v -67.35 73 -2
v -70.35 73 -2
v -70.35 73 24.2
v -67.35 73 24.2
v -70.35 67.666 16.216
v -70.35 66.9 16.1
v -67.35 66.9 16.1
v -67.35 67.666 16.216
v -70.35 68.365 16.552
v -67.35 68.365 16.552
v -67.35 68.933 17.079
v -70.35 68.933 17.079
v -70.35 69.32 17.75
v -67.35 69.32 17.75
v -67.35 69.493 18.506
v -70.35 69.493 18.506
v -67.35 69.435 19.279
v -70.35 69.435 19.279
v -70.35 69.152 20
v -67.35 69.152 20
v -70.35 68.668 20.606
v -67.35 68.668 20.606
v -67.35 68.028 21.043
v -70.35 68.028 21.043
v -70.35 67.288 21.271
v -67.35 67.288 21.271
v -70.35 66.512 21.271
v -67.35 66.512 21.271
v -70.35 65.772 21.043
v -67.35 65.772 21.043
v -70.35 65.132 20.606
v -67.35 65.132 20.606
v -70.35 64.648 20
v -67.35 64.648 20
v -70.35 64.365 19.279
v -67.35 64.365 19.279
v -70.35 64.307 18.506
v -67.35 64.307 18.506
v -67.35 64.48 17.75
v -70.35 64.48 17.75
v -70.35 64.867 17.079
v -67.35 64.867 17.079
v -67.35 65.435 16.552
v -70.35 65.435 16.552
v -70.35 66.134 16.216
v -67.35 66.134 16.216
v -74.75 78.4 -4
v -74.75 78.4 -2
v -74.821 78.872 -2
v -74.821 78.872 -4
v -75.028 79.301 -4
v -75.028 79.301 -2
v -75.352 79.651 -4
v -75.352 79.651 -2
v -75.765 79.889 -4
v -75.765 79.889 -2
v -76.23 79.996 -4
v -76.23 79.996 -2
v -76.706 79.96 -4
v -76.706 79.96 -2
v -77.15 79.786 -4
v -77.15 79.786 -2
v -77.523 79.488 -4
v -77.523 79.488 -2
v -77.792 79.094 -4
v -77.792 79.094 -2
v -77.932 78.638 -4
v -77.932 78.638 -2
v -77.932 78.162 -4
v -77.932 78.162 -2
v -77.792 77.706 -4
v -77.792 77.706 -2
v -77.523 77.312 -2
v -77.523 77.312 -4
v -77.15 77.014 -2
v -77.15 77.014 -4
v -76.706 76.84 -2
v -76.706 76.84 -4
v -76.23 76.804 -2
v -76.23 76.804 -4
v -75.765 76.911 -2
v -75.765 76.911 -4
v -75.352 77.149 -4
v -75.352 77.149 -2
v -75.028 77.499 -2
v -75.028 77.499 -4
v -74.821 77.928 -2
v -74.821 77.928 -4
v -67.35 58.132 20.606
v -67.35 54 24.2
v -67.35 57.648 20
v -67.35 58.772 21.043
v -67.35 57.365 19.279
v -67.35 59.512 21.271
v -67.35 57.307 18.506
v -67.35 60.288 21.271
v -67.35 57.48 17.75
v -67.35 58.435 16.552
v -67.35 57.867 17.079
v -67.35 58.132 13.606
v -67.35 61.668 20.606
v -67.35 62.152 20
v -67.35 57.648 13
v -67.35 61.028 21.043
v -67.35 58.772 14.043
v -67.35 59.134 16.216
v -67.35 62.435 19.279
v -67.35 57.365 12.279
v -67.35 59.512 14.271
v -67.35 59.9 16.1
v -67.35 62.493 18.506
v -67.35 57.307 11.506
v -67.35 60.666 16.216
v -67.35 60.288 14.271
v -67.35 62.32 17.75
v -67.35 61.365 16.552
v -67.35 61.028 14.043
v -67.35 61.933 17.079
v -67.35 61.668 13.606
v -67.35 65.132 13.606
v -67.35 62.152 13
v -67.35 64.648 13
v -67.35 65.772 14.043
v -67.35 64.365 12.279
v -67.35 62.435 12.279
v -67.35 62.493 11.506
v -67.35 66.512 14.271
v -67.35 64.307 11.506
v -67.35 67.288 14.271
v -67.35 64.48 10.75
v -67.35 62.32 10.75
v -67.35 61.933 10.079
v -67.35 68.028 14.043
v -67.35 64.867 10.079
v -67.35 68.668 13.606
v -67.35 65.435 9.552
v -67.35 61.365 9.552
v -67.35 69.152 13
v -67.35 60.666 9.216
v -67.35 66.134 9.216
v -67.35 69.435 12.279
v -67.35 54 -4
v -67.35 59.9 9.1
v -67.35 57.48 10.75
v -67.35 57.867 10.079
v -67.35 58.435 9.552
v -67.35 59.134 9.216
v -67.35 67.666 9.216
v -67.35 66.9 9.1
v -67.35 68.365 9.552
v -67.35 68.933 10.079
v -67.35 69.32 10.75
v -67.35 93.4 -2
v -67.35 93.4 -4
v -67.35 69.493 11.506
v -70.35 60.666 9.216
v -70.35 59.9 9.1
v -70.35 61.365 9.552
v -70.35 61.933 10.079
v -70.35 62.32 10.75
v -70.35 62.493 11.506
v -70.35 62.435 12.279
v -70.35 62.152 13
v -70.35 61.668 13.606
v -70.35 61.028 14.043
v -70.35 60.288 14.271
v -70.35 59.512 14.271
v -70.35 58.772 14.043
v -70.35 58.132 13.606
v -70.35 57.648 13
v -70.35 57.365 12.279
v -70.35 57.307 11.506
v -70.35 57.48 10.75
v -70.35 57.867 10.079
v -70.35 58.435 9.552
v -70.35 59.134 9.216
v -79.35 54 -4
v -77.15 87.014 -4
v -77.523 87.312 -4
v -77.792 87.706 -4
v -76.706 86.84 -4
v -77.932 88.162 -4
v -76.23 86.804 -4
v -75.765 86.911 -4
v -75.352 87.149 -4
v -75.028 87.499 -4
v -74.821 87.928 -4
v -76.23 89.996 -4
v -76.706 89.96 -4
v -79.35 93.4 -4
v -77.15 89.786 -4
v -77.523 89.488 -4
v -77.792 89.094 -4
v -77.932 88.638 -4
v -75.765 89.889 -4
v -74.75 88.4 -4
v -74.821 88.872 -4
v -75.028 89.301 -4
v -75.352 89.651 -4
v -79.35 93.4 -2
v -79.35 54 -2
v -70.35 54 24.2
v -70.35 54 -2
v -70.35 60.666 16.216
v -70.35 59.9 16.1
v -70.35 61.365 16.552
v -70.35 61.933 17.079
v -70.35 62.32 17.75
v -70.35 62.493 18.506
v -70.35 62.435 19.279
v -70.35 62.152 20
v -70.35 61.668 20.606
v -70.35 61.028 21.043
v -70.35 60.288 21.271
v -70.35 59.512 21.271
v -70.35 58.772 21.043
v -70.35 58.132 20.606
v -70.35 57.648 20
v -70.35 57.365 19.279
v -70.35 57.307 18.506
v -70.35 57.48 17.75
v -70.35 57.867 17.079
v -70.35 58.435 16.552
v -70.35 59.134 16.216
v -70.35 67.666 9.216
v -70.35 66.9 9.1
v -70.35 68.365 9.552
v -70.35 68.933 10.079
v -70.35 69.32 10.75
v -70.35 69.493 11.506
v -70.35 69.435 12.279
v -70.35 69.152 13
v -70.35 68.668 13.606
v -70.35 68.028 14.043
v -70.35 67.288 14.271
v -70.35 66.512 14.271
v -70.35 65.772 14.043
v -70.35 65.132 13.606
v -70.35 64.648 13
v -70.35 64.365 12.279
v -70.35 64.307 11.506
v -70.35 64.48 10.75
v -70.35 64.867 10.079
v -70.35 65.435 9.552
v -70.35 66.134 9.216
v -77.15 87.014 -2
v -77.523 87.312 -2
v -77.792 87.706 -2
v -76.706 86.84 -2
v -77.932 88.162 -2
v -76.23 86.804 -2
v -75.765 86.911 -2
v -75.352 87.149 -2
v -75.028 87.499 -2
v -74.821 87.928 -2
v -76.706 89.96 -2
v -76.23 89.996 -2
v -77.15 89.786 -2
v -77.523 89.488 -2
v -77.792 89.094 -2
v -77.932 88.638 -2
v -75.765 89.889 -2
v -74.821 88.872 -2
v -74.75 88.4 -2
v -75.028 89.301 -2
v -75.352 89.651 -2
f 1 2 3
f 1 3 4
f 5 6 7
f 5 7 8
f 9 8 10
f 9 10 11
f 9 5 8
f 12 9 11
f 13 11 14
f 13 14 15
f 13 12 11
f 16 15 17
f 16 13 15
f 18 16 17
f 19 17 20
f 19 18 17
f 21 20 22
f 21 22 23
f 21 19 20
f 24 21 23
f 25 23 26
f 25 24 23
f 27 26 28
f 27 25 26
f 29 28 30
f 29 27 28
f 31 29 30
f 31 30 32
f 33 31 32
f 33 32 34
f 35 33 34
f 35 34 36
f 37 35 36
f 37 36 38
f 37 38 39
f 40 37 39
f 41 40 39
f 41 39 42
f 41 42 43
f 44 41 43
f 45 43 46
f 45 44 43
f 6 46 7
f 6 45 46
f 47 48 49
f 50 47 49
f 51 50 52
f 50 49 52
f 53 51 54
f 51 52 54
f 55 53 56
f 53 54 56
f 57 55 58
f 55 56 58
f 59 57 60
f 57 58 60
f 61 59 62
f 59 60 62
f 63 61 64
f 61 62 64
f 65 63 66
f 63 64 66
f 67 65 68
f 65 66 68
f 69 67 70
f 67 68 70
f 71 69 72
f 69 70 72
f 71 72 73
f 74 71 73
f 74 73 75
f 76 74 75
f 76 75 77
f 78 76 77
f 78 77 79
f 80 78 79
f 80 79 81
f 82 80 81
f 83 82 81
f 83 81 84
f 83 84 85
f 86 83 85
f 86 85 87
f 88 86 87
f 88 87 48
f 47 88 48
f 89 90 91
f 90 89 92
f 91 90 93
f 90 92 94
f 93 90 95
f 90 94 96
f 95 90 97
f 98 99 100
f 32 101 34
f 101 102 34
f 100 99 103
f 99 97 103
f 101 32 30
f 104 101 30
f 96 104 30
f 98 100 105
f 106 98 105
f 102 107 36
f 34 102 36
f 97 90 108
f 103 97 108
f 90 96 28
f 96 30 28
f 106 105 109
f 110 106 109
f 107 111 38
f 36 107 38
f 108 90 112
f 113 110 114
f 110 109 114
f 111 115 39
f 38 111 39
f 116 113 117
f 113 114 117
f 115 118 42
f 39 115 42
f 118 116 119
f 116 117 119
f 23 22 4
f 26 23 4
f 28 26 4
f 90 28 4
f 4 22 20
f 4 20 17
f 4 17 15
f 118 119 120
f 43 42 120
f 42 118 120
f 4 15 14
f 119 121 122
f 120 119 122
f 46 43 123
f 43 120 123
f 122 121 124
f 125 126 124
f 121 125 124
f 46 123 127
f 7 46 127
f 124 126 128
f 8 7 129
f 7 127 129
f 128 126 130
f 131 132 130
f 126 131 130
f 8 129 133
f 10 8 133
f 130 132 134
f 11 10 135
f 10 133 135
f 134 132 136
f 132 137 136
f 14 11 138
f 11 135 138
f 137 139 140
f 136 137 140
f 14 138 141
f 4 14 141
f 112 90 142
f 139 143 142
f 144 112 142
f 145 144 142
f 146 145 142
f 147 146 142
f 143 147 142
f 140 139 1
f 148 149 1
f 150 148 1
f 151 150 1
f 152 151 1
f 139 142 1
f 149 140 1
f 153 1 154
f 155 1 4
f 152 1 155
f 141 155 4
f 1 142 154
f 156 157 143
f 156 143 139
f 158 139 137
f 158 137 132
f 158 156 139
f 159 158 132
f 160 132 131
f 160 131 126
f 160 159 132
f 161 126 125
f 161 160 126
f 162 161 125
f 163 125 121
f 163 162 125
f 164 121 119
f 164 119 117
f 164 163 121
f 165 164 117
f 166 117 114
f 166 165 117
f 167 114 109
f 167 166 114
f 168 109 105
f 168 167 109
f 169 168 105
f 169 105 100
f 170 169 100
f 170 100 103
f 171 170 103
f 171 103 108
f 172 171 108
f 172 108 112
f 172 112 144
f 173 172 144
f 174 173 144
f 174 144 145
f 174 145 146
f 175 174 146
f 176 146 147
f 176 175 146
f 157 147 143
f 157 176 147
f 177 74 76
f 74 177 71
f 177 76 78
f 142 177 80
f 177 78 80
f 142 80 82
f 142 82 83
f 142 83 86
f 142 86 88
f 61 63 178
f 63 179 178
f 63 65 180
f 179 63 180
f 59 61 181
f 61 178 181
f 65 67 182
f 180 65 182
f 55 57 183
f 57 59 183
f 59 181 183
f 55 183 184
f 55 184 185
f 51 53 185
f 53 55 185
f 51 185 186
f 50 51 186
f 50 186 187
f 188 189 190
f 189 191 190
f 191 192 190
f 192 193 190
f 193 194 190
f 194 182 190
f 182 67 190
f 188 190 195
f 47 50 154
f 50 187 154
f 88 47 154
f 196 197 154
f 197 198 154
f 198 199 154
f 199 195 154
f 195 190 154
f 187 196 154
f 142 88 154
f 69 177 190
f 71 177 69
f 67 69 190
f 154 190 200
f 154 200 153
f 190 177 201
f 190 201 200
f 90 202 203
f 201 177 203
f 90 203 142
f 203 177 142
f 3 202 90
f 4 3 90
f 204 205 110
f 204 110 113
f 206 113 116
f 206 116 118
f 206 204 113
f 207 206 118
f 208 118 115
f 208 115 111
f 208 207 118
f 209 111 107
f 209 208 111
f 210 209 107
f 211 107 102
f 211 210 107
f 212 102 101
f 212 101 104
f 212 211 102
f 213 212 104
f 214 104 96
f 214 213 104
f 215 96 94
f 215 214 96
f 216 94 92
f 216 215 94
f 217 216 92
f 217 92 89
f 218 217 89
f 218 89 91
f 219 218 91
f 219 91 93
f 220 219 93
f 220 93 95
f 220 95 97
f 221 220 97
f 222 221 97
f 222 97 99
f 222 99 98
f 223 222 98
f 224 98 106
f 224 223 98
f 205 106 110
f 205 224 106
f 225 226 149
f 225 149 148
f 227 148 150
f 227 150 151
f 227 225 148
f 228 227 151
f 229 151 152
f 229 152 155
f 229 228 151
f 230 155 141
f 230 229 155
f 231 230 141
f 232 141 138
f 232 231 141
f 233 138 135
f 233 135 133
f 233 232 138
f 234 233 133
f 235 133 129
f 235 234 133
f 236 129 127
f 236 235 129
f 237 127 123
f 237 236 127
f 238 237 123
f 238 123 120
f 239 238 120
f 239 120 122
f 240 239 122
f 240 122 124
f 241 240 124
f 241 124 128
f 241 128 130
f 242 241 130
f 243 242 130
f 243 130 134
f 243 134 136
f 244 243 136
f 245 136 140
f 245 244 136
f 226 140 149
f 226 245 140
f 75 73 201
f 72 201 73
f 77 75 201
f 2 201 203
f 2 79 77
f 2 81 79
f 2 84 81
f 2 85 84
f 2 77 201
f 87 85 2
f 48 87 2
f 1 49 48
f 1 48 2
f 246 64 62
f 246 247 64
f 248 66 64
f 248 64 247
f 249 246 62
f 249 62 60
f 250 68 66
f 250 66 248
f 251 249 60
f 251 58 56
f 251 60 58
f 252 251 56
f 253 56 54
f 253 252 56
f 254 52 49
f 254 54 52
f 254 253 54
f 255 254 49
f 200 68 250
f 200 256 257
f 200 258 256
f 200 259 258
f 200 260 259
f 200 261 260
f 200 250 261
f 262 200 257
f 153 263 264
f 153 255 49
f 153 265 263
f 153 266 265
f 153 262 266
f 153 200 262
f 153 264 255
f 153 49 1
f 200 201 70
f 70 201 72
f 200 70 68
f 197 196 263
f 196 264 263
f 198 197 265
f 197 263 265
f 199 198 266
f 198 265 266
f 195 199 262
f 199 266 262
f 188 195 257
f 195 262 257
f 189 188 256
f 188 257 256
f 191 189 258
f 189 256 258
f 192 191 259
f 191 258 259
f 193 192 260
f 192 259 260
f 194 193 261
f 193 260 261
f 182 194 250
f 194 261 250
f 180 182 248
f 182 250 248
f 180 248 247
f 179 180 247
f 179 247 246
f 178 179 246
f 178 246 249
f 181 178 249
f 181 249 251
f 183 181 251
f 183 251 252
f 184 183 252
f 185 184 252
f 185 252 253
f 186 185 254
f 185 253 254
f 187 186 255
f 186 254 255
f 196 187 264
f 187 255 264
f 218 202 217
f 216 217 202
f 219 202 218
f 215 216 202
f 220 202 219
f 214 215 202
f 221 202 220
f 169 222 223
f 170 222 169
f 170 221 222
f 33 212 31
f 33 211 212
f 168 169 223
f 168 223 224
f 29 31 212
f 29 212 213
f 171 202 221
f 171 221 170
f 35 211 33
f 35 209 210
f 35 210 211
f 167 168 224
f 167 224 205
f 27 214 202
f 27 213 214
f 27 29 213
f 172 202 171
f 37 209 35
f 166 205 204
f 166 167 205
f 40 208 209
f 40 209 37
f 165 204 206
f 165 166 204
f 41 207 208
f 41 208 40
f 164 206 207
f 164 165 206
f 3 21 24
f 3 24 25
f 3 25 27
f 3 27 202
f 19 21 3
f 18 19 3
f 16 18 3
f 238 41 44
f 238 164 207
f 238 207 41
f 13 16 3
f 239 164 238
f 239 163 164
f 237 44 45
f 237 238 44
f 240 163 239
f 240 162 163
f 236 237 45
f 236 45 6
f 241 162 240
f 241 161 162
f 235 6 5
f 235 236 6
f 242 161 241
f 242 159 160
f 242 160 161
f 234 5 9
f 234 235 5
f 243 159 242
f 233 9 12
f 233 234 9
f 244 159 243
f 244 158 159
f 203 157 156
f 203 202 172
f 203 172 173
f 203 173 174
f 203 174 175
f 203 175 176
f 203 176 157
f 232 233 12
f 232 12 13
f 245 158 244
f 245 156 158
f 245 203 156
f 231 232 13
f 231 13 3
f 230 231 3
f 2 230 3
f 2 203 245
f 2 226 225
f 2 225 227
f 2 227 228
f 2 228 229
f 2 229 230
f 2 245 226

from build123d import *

# Parameters (mm, degrees)
FOOT_SKETCH_W              = 12
FOOT_SKETCH_H              = 39.4
FOOT_DEPTH                 = 2
UPRIGHT_SKETCH_W           = 3
UPRIGHT_SKETCH_H           = 19
UPRIGHT_DEPTH              = 26.2
SHEATH_HOLES_SKETCH_R      = 2.6
SHEATH_HOLES_DEPTH         = 3
SERVO_SCREW_HOLES_SKETCH_R = 1.6
SERVO_SCREW_HOLES_DEPTH    = 15


with BuildPart() as part:
    # Foot Sketch → Foot (new body)
    with BuildSketch(Plane.XY.offset(-4)):
        with Locations((-73.35, 73.7)):
            Rectangle(FOOT_SKETCH_W, FOOT_SKETCH_H)
    extrude(amount=FOOT_DEPTH)

    # Upright Sketch → Upright (add)
    with BuildSketch(Plane.XY.offset(-2)):
        with Locations((-68.85, 63.5)):
            Rectangle(UPRIGHT_SKETCH_W, UPRIGHT_SKETCH_H)
    extrude(amount=UPRIGHT_DEPTH)

    # Sheath Holes Sketch → Sheath Holes (cut)
    with BuildSketch(Plane(origin=(-70.35, 0, 0), x_dir=(0, 0, -1), z_dir=(1, 0, 0))):
        with Locations((-18.7, 66.9)):
            Circle(SHEATH_HOLES_SKETCH_R)
        with Locations((-11.7, 59.9)):
            Circle(SHEATH_HOLES_SKETCH_R)
        with Locations((-11.7, 66.9)):
            Circle(SHEATH_HOLES_SKETCH_R)
        with Locations((-18.7, 59.9)):
            Circle(SHEATH_HOLES_SKETCH_R)
    extrude(amount=SHEATH_HOLES_DEPTH, mode=Mode.SUBTRACT)

    # Servo Screw Holes Sketch → Servo Screw Holes (cut, symmetric)
    with BuildSketch(Plane.XY):
        with Locations((-76.35, 78.4)):
            Circle(SERVO_SCREW_HOLES_SKETCH_R)
        with Locations((-76.35, 88.4)):
            Circle(SERVO_SCREW_HOLES_SKETCH_R)
    extrude(amount=SERVO_SCREW_HOLES_DEPTH, both=True, mode=Mode.SUBTRACT)


solid = part.part
